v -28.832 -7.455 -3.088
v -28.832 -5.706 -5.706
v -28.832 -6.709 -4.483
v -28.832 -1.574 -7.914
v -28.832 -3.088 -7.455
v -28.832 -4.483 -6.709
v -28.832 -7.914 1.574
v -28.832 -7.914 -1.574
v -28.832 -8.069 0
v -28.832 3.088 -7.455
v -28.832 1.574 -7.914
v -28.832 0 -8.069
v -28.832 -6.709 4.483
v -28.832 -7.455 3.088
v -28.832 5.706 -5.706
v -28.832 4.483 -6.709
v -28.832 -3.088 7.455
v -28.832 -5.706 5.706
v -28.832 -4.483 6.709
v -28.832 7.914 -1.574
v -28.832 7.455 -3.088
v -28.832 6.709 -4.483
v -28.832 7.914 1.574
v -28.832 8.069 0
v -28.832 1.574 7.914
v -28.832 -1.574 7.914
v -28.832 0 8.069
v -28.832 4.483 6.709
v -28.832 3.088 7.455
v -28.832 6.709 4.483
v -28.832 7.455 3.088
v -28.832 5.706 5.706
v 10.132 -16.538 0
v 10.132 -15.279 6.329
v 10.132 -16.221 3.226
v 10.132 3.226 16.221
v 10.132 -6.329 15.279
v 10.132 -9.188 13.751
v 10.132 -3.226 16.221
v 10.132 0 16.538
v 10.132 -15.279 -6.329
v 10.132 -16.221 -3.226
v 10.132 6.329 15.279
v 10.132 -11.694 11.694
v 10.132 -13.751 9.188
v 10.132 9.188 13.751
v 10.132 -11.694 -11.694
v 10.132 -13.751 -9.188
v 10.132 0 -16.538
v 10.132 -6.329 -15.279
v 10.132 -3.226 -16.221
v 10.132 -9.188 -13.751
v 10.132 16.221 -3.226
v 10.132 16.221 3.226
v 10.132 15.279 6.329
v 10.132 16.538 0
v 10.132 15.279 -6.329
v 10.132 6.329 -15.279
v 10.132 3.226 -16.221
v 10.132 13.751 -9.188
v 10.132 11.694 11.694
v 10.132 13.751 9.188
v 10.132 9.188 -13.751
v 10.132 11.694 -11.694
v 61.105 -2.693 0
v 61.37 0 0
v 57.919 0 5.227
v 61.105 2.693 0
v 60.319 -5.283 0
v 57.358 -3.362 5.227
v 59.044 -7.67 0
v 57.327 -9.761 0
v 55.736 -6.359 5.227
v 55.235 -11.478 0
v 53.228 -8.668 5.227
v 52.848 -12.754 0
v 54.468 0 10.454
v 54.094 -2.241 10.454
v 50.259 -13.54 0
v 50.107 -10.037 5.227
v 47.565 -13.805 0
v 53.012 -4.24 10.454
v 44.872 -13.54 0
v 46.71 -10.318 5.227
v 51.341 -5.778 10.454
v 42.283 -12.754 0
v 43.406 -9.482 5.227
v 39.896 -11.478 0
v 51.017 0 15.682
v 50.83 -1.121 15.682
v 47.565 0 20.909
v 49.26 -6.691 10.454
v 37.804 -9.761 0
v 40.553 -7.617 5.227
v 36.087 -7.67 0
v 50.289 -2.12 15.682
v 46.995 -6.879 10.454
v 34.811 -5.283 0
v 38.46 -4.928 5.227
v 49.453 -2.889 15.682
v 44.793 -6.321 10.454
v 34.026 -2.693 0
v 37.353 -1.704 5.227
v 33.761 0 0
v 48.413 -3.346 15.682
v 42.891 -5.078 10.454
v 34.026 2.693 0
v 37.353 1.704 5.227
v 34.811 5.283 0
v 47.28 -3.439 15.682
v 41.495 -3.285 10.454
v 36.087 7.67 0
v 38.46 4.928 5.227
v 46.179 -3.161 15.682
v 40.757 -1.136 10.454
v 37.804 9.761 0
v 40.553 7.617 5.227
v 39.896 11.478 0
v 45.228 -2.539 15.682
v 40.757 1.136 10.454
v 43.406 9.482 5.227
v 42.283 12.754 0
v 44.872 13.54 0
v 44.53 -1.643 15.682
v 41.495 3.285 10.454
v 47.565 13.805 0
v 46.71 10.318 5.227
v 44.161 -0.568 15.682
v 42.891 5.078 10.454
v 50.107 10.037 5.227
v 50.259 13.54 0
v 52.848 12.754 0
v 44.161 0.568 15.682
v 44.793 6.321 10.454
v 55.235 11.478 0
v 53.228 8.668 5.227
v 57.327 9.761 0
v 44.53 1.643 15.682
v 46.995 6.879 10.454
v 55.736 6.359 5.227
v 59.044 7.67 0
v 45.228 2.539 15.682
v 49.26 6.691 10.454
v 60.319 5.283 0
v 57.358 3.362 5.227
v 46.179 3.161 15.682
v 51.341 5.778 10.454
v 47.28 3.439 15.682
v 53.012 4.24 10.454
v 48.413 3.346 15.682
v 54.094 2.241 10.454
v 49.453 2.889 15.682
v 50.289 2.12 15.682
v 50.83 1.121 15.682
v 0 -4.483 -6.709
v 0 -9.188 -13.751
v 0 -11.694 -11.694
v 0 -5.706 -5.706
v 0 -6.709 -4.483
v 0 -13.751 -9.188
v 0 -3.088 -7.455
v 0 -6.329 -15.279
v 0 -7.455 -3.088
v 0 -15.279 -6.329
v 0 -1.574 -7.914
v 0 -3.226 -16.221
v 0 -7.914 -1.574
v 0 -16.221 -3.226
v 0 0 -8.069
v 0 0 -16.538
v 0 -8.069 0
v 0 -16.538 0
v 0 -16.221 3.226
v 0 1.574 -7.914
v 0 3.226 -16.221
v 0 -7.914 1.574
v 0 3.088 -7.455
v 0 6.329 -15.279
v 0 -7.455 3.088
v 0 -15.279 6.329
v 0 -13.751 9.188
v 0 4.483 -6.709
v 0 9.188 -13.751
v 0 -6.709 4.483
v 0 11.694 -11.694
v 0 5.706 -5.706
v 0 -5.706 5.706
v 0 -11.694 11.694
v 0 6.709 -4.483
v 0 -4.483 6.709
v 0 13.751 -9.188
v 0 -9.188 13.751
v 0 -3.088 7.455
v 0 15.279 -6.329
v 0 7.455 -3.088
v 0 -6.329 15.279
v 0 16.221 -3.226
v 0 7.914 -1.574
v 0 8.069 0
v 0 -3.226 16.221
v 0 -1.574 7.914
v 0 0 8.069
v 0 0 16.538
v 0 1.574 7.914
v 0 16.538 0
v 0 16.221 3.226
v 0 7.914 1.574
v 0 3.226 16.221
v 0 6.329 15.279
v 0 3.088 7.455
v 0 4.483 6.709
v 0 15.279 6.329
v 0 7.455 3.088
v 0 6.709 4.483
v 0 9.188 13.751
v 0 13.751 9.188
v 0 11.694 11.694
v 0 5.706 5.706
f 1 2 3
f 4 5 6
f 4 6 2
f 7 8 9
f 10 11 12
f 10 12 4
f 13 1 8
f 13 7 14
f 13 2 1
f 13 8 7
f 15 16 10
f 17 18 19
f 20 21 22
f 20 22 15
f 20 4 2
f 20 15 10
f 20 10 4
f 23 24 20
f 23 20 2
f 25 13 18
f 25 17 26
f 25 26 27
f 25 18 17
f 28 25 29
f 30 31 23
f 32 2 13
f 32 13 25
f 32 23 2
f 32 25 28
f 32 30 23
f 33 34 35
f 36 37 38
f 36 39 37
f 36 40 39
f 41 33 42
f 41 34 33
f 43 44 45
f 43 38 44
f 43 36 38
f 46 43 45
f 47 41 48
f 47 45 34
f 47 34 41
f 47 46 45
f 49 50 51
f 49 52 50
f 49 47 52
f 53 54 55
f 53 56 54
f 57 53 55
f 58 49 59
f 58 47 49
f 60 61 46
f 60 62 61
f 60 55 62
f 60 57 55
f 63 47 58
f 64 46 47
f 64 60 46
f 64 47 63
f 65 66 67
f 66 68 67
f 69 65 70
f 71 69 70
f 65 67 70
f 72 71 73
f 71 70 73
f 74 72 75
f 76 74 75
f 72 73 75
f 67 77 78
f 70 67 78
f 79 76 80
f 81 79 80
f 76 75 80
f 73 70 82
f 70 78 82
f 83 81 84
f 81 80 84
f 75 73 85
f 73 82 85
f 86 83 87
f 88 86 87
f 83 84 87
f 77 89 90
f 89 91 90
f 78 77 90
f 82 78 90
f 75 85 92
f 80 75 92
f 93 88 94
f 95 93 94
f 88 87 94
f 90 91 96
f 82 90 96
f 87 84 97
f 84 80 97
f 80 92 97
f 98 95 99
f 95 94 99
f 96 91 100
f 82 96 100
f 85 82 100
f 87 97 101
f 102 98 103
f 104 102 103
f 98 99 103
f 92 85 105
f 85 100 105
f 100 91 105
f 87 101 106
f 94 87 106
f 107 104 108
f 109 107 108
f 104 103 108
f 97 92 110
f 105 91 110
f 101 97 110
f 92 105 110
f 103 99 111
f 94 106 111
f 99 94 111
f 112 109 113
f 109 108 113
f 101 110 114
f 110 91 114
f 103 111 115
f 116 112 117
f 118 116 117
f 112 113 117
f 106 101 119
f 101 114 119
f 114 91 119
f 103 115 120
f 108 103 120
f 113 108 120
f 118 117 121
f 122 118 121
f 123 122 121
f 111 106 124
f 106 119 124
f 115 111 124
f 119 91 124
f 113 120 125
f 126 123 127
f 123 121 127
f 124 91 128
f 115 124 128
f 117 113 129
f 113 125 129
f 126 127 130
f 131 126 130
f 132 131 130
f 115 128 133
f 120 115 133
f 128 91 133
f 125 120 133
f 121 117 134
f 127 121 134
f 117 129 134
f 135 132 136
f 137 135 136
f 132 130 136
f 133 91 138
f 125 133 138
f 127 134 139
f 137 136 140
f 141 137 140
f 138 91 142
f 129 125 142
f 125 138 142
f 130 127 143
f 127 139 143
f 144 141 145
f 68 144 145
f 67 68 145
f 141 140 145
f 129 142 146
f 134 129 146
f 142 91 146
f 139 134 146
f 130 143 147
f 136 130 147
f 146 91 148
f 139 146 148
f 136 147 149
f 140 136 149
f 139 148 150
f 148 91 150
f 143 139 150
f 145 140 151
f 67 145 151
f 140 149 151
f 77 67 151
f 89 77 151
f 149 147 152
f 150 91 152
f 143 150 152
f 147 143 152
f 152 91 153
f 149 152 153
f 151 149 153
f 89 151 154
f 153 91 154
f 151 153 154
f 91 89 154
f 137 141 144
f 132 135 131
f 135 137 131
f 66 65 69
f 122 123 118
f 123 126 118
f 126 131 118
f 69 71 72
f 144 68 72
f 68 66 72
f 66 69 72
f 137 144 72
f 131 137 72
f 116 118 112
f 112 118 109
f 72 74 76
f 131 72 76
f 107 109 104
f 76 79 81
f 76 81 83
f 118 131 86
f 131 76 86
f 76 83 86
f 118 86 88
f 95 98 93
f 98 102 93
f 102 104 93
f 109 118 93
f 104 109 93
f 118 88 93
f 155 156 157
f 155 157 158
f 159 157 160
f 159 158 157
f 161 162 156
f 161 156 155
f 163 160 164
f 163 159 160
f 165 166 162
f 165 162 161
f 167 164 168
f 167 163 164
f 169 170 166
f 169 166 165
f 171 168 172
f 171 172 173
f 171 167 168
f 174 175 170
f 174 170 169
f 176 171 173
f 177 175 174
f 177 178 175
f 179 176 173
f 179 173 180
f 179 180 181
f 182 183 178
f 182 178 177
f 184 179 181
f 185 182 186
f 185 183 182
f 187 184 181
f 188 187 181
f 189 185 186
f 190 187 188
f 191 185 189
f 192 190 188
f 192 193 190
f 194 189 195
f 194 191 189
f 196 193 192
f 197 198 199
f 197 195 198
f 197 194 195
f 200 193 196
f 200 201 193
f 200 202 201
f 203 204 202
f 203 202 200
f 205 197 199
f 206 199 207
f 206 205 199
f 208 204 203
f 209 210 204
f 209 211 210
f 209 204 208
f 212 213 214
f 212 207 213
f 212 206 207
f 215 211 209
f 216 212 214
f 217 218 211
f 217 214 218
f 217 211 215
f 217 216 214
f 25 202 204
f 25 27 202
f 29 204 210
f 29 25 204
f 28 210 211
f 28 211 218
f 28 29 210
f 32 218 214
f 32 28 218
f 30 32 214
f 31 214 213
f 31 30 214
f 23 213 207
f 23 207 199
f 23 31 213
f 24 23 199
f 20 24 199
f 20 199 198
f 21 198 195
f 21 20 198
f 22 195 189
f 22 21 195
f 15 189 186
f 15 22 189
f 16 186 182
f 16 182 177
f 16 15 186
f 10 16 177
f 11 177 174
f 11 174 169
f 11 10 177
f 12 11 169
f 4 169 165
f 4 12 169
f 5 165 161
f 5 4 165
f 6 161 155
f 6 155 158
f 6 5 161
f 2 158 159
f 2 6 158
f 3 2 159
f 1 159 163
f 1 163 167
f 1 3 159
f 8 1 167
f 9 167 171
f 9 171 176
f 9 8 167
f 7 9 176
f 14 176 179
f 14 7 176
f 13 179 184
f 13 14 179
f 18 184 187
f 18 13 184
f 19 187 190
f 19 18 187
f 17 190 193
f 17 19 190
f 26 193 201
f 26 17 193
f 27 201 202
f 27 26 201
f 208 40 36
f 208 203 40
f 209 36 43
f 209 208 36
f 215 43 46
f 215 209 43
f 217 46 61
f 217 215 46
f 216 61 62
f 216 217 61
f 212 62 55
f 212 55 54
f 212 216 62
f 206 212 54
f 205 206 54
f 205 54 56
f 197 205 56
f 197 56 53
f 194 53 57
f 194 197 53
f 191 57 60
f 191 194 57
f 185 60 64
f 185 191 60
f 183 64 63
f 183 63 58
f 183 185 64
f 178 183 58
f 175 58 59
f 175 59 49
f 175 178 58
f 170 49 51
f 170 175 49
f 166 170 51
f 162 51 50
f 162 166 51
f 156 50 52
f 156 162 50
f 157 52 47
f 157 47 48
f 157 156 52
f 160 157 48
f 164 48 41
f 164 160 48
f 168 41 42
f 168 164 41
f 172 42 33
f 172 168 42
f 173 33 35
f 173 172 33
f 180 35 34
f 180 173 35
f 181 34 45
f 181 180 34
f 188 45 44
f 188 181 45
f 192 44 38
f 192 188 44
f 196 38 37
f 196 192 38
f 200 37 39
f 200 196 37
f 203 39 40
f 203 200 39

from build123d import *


with BuildPart() as f1:
    # F0 (on Front) → F1 (revolve)
    with BuildSketch(Plane.XZ):
        Polygon((-28.831715, 0), (0, 0), (10.131622, 0), (10.131622, 16.53838), (0, 16.53838), (0, 8.069375), (-28.831715, 8.069375), align=None)
    revolve(axis=Axis((5.065811, 0, 0), (-1, 0, 0)))


with BuildPart() as f3:
    # F2 (on Front) → F3 (revolve)
    with BuildSketch(Plane.XZ):
        Polygon((61.370298, 0), (47.565453, 20.908967), (47.565453, 0), align=None)
    revolve(axis=Axis((47.565453, 0, 10.454483), (0, 0, -1)))


solid = Compound([f1.part, f3.part])
